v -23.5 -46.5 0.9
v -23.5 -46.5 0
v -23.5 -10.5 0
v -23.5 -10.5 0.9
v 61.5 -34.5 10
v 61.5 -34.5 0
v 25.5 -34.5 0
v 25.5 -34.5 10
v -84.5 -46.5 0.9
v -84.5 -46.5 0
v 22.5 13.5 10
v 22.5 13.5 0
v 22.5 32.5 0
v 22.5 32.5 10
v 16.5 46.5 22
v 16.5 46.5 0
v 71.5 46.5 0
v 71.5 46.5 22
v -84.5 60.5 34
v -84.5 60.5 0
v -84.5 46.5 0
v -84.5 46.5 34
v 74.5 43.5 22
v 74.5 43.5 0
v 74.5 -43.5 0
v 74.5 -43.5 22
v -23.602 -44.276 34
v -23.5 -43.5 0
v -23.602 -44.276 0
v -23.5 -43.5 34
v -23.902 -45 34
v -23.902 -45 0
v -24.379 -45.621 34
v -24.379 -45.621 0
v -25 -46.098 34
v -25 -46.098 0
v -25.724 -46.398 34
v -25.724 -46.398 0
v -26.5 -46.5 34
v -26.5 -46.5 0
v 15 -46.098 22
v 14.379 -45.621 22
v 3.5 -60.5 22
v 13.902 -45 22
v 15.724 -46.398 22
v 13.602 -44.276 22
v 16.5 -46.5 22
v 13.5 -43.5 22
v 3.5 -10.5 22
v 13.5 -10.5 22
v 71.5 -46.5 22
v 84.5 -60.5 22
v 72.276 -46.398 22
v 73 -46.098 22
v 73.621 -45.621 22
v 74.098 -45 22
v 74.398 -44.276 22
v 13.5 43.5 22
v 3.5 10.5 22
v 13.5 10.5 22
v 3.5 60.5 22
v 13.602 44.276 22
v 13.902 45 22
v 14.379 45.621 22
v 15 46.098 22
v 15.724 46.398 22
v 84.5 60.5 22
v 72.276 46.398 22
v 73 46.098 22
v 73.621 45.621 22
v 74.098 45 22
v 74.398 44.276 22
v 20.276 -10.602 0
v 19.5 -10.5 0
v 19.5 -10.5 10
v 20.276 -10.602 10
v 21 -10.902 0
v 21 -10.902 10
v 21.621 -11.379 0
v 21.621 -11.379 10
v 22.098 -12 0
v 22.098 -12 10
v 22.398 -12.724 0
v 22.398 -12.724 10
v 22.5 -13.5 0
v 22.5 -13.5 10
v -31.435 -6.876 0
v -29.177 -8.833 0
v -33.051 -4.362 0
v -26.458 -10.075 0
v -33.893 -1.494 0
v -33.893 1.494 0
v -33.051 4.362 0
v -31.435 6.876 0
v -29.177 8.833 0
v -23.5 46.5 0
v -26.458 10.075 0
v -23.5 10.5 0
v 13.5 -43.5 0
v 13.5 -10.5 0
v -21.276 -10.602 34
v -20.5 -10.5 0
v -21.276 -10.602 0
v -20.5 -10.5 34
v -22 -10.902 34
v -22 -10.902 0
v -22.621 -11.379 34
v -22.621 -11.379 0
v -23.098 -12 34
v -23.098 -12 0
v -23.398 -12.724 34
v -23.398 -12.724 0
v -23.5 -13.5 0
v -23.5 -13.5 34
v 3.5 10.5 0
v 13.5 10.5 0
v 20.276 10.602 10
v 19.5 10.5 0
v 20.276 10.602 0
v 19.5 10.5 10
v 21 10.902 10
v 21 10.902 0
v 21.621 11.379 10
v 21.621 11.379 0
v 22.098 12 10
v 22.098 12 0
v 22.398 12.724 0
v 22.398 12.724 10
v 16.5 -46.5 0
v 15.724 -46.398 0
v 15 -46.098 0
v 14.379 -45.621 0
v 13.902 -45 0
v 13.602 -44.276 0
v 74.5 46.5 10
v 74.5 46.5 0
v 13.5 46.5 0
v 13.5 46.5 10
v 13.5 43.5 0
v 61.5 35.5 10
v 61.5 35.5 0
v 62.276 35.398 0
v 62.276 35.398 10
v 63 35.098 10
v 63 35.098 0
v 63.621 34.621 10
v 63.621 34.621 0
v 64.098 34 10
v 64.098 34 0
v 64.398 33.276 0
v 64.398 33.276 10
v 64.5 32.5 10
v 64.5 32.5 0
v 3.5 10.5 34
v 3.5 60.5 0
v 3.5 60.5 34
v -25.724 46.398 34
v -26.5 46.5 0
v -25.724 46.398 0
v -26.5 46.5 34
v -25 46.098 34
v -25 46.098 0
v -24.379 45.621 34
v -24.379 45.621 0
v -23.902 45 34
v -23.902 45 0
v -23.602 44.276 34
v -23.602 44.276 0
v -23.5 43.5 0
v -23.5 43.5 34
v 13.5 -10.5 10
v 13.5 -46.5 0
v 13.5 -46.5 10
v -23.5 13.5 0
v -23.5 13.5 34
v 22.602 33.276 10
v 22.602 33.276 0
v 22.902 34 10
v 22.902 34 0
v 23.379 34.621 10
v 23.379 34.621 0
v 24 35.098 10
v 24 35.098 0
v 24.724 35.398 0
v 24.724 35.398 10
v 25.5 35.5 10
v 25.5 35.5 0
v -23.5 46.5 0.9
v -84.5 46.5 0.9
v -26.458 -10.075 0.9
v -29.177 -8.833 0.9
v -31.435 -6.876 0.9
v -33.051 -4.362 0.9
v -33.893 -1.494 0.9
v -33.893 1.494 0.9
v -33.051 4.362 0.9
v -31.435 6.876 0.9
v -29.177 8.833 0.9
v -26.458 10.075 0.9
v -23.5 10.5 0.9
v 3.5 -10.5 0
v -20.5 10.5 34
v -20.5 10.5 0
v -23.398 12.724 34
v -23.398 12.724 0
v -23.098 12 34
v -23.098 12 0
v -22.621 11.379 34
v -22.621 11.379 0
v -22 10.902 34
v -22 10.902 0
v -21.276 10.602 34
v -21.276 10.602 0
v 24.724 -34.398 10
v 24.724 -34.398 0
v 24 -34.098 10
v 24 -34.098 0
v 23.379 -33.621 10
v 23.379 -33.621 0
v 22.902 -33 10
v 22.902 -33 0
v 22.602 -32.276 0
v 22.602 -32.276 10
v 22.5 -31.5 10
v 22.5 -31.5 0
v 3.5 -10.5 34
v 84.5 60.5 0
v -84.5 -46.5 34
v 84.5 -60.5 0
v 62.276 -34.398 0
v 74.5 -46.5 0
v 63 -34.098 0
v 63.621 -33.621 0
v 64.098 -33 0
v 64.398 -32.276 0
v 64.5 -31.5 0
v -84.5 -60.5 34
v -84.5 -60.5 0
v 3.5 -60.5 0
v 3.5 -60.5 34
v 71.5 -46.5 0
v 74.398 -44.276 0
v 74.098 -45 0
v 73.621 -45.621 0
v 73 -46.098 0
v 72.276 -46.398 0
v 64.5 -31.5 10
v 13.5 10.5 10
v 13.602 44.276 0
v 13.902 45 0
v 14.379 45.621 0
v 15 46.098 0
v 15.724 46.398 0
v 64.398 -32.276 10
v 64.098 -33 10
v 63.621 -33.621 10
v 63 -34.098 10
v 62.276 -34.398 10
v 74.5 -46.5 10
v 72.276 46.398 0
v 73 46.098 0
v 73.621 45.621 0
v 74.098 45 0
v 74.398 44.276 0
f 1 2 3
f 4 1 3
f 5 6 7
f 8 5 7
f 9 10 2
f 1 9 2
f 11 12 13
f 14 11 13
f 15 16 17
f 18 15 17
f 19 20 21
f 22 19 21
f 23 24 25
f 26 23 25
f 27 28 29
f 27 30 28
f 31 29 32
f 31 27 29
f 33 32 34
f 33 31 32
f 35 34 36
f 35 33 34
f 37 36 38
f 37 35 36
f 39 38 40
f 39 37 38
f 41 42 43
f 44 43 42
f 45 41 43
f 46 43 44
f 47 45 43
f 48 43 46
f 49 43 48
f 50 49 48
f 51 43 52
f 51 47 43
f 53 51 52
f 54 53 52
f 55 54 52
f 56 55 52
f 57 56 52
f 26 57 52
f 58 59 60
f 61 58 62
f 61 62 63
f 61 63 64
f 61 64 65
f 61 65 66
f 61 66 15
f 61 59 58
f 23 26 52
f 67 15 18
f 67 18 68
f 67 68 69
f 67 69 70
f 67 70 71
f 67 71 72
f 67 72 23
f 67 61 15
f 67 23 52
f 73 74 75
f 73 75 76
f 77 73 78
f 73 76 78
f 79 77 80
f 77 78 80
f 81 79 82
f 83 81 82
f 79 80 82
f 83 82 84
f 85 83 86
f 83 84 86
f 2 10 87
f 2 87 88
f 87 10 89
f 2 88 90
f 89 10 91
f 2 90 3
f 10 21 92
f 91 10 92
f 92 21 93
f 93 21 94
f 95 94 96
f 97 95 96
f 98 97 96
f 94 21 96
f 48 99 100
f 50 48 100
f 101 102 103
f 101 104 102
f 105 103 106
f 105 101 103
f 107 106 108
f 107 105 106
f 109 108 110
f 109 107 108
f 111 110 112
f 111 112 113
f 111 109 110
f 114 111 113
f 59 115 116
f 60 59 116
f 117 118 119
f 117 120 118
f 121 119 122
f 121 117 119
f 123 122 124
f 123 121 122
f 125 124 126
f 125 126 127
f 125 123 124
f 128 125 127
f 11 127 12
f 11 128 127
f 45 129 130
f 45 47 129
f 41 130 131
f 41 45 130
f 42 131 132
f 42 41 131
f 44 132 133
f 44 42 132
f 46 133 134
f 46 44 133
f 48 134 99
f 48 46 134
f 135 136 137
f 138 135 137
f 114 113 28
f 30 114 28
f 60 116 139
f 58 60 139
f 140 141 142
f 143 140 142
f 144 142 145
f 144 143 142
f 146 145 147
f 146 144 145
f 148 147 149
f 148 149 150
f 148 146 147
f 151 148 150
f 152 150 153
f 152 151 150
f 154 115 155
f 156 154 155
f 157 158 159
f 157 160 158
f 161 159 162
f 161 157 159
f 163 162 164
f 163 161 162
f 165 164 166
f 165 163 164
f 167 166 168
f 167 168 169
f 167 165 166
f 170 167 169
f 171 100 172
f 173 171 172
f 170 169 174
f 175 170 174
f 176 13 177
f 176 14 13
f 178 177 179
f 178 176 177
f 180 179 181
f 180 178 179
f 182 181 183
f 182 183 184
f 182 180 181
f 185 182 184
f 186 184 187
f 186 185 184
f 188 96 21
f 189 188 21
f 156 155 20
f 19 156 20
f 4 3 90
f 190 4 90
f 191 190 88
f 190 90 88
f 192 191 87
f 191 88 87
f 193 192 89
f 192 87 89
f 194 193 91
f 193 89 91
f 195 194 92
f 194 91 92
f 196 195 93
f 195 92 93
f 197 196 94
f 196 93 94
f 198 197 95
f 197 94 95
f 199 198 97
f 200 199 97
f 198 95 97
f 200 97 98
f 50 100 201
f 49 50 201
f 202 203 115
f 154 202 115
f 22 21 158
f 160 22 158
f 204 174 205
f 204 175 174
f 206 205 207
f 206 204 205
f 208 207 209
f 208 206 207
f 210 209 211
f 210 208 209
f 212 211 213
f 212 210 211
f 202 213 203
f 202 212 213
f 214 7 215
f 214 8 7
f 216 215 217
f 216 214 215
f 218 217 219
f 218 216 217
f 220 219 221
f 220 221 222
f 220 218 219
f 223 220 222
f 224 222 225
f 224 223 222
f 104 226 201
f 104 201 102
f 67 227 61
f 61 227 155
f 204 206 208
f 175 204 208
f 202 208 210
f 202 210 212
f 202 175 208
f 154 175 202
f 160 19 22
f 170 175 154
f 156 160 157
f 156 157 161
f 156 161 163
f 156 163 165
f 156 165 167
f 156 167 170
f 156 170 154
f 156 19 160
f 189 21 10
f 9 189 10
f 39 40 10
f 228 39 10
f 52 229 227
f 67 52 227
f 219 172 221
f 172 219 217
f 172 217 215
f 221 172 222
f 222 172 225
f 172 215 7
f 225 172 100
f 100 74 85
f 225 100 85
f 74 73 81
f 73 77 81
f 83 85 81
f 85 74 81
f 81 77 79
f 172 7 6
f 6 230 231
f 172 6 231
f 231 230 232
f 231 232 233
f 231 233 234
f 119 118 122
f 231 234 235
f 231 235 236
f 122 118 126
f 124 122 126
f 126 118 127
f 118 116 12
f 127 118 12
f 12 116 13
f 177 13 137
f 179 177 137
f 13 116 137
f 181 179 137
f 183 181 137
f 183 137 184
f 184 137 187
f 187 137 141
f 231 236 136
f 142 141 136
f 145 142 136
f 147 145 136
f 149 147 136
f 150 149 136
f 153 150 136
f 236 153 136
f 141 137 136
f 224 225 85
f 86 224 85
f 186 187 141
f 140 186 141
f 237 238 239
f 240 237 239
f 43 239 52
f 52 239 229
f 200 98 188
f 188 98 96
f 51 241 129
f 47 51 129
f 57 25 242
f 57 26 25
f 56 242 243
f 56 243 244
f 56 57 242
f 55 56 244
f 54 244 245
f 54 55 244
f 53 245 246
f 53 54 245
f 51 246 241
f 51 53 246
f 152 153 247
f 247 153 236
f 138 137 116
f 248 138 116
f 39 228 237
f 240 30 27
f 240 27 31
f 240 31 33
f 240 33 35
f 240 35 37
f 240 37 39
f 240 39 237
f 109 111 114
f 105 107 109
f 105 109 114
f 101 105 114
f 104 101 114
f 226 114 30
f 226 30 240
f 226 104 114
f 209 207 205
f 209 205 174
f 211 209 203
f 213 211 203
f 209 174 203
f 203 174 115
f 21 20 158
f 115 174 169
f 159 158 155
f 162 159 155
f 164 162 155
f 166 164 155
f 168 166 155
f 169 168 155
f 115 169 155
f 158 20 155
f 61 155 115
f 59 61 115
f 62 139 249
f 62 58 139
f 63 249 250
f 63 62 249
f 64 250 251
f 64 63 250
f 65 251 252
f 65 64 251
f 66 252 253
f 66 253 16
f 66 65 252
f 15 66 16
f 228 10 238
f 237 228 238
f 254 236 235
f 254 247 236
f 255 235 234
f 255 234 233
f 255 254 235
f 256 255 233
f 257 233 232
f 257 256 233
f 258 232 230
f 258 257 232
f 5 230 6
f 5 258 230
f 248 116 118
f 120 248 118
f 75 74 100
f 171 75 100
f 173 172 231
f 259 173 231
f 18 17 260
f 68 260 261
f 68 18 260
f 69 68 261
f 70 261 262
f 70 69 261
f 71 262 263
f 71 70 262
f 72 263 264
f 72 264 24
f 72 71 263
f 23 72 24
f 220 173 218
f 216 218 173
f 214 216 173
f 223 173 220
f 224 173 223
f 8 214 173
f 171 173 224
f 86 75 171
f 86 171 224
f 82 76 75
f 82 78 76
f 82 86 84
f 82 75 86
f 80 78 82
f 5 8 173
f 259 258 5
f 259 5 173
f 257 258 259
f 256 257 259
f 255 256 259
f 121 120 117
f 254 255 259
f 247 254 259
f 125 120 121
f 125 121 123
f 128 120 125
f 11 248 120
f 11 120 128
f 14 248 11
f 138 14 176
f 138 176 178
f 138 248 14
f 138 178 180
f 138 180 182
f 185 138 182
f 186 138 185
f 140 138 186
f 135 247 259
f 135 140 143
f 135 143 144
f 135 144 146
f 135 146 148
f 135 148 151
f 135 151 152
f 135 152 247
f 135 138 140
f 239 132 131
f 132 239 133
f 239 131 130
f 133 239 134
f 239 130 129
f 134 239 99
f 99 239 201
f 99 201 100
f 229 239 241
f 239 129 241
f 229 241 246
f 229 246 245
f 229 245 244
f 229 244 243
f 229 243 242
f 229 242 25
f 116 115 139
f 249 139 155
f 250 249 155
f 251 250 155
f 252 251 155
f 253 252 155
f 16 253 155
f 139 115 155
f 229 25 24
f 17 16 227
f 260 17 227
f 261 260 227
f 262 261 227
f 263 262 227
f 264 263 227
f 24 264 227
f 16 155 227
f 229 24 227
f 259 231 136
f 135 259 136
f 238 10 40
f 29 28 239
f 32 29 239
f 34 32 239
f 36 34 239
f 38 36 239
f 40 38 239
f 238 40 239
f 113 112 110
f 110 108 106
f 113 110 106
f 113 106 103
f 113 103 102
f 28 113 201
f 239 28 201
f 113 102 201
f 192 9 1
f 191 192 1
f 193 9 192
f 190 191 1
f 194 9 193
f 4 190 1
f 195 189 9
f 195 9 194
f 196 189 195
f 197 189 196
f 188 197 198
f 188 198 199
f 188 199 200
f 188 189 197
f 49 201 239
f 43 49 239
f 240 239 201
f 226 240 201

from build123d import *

# Parameters (mm, degrees)
F1_DEPTH = 34
F2_DEPTH = 0.9
F3_DEPTH = 10
F4_DEPTH = 22
F5_R     = 3
F5_2_R   = 3
F5_3_R   = 3
F5_4_R   = 3


with BuildPart() as f1:
    # F0 (on Top) → F1 (new body)
    with BuildSketch(Plane.XY):
        Polygon((3.5, 10.5), (3.5, 60.5), (-84.5, 60.5), (-84.5, 46.5), (-23.5, 46.5), (-23.5, 10.5), align=None)
    extrude(amount=F1_DEPTH)

    # F5
    f5_edges = [f1.edges().sort_by_distance(p)[0] for p in [
        (-23.5, 46.5, 17),
        (-23.5, 10.5, 17),
    ]]
    fillet(f5_edges, radius=F5_R)


with BuildPart() as f1b:
    # F0 (on Top) → F1, piece 2 (new body)
    with BuildSketch(Plane.XY):
        Polygon((-84.5, -60.5), (3.5, -60.5), (3.5, -10.5), (-23.5, -10.5), (-23.5, -46.5), (-84.5, -46.5), align=None)
    extrude(amount=F1_DEPTH)

    # F5#2
    f5_2_edges = [f1b.edges().sort_by_distance(p)[0] for p in [
        (-23.5, -46.5, 17),
        (-23.5, -10.5, 17),
    ]]
    fillet(f5_2_edges, radius=F5_2_R)


with BuildPart() as f2:
    # F0 (on Top) → F2 (new body)
    with BuildSketch(Plane.XY):
        with BuildLine():
            Line((-84.5, 46.5), (-84.5, -46.5))
            Line((-84.5, -46.5), (-23.5, -46.5))
            Line((-23.5, -46.5), (-23.5, -10.5))
            ThreePointArc((-23.5, -10.5), (-34, 0), (-23.5, 10.5))
            Line((-23.5, 10.5), (-23.5, 46.5))
            Line((-23.5, 46.5), (-84.5, 46.5))
        make_face()
    extrude(amount=F2_DEPTH)


with BuildPart() as f3:
    # F0 (on Top) → F3 (new body)
    with BuildSketch(Plane.XY):
        Polygon((22.5, -10.5), (13.5, -10.5), (13.5, -46.5), (74.5, -46.5), (74.5, 46.5), (13.5, 46.5), (13.5, 10.5), (22.5, 10.5), (22.5, 35.5), (64.5, 35.5), (64.5, -34.5), (22.5, -34.5), align=None)
    extrude(amount=F3_DEPTH)

    # F5#3
    f5_3_edges = [f3.edges().sort_by_distance(p)[0] for p in [
        (22.5, 35.5, 5),
        (64.5, 35.5, 5),
        (22.5, -34.5, 5),
        (64.5, -34.5, 5),
        (22.5, 10.5, 5),
        (22.5, -10.5, 5),
    ]]
    fillet(f5_3_edges, radius=F5_3_R)


with BuildPart() as f4:
    # F0 (on Top) → F4 (new body)
    with BuildSketch(Plane.XY):
        Polygon((3.5, -60.5), (84.5, -60.5), (84.5, 60.5), (3.5, 60.5), (3.5, 10.5), (13.5, 10.5), (13.5, 46.5), (74.5, 46.5), (74.5, -46.5), (13.5, -46.5), (13.5, -10.5), (3.5, -10.5), align=None)
    extrude(amount=F4_DEPTH)

    # F5#4
    f5_4_edges = [f4.edges().sort_by_distance(p)[0] for p in [
        (13.5, 46.5, 11),
        (74.5, 46.5, 11),
        (13.5, -46.5, 11),
        (74.5, -46.5, 11),
    ]]
    fillet(f5_4_edges, radius=F5_4_R)


solid = Compound([f1.part, f1b.part, f2.part, f3.part, f4.part])
